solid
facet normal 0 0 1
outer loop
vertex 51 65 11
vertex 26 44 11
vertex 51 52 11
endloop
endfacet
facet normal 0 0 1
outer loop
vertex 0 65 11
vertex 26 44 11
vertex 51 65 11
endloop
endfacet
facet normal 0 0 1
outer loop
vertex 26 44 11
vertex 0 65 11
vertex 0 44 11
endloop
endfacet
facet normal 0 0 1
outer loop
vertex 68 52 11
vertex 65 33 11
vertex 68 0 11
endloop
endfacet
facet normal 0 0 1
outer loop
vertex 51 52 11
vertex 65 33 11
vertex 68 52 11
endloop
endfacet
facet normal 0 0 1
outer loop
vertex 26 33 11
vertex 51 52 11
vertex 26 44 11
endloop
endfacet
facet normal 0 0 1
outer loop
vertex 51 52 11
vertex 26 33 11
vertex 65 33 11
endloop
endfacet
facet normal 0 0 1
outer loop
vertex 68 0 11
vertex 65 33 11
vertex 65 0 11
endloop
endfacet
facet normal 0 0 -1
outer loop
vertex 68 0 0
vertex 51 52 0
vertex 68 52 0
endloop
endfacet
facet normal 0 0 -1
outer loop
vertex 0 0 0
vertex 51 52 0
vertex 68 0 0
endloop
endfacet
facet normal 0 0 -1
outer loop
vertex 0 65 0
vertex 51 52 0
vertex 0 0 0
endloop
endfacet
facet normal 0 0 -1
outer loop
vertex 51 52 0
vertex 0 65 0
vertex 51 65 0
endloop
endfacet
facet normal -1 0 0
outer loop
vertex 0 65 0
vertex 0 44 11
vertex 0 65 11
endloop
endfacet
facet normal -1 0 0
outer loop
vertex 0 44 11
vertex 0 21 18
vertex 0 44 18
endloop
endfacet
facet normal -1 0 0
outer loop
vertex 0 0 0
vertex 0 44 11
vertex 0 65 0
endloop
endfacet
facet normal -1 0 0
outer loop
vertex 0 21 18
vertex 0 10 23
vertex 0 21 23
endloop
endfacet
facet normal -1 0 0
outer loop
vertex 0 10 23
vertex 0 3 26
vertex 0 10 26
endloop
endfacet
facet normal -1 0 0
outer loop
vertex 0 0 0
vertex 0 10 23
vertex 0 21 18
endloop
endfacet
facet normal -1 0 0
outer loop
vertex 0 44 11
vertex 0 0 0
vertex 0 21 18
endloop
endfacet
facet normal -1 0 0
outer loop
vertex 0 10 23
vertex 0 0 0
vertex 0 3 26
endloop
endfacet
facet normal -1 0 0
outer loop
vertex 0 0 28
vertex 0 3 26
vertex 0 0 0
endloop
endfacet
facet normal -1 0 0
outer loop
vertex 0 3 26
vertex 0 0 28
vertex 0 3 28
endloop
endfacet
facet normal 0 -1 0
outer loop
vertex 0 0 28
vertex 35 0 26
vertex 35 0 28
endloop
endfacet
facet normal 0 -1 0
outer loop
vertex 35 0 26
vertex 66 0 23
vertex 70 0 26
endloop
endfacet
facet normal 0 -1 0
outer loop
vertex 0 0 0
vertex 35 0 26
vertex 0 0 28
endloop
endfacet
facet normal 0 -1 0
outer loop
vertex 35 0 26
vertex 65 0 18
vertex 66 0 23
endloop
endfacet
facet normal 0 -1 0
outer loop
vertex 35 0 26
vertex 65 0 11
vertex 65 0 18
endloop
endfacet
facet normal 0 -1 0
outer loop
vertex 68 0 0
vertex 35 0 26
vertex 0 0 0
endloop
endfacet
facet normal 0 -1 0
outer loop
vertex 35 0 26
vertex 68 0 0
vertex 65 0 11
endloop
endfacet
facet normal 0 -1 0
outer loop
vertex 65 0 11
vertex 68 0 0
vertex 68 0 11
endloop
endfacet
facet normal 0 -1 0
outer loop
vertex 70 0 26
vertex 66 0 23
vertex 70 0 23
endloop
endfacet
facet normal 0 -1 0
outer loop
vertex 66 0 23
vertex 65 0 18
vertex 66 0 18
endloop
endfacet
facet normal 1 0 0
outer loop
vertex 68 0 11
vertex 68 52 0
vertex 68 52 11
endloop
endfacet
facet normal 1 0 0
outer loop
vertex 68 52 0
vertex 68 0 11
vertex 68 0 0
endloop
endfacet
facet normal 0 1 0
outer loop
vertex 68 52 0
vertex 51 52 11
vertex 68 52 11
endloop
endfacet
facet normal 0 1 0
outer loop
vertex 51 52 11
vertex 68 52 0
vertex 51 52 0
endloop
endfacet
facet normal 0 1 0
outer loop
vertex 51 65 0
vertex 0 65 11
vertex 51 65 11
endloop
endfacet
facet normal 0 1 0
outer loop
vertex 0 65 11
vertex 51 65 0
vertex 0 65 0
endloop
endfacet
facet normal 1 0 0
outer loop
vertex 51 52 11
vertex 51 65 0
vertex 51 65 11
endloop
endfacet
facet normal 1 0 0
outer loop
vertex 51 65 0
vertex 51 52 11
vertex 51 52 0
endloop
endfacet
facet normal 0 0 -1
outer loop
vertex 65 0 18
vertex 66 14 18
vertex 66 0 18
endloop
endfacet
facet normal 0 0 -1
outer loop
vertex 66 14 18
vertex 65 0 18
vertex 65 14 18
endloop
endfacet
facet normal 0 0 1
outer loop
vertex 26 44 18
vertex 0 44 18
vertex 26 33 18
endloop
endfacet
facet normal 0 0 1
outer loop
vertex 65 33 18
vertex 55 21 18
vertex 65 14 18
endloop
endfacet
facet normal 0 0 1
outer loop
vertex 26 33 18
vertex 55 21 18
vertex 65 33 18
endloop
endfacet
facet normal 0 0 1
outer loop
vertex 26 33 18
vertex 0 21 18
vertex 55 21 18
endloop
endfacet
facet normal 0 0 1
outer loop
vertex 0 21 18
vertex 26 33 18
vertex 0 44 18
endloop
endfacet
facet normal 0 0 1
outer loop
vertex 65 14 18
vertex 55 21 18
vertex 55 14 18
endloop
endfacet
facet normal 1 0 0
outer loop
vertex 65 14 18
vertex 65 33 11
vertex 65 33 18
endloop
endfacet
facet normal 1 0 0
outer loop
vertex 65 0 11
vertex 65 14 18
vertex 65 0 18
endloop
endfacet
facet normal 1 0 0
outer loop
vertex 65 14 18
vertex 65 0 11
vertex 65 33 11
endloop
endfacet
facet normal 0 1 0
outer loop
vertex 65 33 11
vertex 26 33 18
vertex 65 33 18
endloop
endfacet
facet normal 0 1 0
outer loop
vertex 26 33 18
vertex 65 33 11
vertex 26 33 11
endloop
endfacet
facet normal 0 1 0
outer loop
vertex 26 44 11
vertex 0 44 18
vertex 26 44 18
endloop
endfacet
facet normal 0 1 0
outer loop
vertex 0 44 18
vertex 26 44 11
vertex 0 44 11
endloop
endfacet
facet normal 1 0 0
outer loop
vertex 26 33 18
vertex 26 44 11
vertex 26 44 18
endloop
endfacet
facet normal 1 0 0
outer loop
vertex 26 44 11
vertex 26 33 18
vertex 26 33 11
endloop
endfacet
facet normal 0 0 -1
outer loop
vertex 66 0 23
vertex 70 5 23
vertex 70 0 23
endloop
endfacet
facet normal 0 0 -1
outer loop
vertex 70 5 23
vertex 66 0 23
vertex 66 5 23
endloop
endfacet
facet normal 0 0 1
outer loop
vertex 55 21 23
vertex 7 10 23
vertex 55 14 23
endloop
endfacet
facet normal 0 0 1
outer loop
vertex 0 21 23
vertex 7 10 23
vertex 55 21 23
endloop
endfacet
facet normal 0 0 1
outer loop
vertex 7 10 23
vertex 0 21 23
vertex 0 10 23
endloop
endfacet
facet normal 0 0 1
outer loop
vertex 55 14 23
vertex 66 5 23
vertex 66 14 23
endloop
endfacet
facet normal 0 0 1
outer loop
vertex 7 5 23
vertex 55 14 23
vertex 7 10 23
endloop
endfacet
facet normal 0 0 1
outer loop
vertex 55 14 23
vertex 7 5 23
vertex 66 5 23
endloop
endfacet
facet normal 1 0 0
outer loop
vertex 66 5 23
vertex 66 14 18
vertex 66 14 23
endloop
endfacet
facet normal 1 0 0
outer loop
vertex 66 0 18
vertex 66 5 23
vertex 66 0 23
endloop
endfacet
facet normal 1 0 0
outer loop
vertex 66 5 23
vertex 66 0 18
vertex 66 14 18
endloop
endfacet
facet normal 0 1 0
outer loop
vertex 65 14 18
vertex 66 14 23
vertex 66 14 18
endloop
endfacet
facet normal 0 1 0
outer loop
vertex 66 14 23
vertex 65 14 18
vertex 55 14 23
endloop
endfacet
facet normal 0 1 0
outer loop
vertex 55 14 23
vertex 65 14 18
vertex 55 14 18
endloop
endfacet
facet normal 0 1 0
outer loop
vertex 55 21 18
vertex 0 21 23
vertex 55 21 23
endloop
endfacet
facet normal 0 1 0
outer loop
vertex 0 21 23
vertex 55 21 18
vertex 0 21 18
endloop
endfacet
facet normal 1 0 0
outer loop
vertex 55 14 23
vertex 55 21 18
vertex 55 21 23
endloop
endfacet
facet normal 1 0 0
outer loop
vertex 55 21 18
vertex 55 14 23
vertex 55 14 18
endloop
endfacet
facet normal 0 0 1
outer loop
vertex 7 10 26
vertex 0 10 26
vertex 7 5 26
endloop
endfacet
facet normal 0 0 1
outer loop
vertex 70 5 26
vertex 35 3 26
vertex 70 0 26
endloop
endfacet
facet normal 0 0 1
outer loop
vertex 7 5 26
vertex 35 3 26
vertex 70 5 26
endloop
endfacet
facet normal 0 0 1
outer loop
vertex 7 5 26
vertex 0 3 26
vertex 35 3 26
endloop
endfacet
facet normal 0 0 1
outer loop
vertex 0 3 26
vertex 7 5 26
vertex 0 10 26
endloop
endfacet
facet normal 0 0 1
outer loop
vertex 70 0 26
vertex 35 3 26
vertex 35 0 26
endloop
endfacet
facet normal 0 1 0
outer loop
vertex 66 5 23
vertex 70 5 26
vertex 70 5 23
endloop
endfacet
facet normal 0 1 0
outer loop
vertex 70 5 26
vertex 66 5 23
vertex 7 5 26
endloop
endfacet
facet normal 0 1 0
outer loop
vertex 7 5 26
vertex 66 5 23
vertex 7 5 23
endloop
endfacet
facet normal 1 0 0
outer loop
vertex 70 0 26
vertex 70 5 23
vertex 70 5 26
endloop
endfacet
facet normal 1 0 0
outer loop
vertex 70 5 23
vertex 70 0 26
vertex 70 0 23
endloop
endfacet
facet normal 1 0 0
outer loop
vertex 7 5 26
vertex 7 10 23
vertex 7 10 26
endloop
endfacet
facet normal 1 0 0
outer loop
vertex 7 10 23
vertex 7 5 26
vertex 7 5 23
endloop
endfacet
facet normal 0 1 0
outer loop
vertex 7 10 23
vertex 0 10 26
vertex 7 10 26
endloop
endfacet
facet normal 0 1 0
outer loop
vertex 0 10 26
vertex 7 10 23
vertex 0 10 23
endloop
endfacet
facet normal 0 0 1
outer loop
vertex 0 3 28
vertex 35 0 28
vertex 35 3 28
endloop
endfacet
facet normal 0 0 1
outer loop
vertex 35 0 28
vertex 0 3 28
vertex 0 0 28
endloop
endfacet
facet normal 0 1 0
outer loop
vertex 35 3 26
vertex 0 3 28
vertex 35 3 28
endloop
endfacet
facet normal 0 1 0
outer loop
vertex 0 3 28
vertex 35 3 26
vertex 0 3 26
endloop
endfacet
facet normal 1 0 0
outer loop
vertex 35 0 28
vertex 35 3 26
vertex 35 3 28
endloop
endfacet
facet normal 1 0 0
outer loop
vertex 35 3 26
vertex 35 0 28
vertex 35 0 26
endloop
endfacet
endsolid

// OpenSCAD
translate([8.5, 6.5, 5.5]) color([0.1552431358080847, 0.1767648869043179, 0.991228648099722]) cube([17, 13, 11], center=true);
translate([25.5, 6.5, 5.5]) color([0.13558077637136434, 0.20650423900368708, 0.9151210693627757]) cube([17, 13, 11], center=true);
translate([42.5, 6.5, 5.5]) color([0.49673738754911745, 0.7672539256192649, 0.969306850533619]) cube([17, 13, 11], center=true);
translate([59.5, 6.5, 5.5]) color([0.23531586477578126, 0.13212860983739783, 0.23368957459901674]) cube([17, 13, 11], center=true);
translate([8.5, 19.5, 5.5]) color([0.38460662479298113, 0.6084990843462054, 0.1325407149567407]) cube([17, 13, 11], center=true);
translate([25.5, 19.5, 5.5]) color([0.4984659545183915, 0.9178662904203972, 0.6160167741323543]) cube([17, 13, 11], center=true);
translate([42.5, 19.5, 5.5]) color([0.02601445858505036, 0.596125612844632, 0.48919913512172475]) cube([17, 13, 11], center=true);
translate([59.5, 19.5, 5.5]) color([0.30869925031539414, 0.9586301909392594, 0.5555224541780607]) cube([17, 13, 11], center=true);
translate([8.5, 32.5, 5.5]) color([0.16303723797834868, 0.8790785483620981, 0.8092366229990562]) cube([17, 13, 11], center=true);
translate([25.5, 32.5, 5.5]) color([0.7373715302416316, 0.5460288399006699, 0.7042240787132147]) cube([17, 13, 11], center=true);
translate([42.5, 32.5, 5.5]) color([0.07877233817546292, 0.13744427713979768, 0.40185422229333856]) cube([17, 13, 11], center=true);
translate([59.5, 32.5, 5.5]) color([0.1910666288561843, 0.31642065037316636, 0.2917281417853558]) cube([17, 13, 11], center=true);
translate([8.5, 45.5, 5.5]) color([0.9437754009602987, 0.20866341172373193, 0.3151573145870893]) cube([17, 13, 11], center=true);
translate([25.5, 45.5, 5.5]) color([0.7470721078045024, 0.24960896628473228, 0.8629627260654799]) cube([17, 13, 11], center=true);
translate([42.5, 45.5, 5.5]) color([0.6684326881602258, 0.6597695027130189, 0.22591717735012307]) cube([17, 13, 11], center=true);
translate([59.5, 45.5, 5.5]) color([0.3441717078654829, 0.16233220178561225, 0.01697652307419406]) cube([17, 13, 11], center=true);
translate([8.5, 58.5, 5.5]) color([0.5735931064152219, 0.05818297514553228, 0.6304378073753134]) cube([17, 13, 11], center=true);
translate([25.5, 58.5, 5.5]) color([0.35341956482818127, 0.49110709598533775, 0.06132304686728618]) cube([17, 13, 11], center=true);
translate([42.5, 58.5, 5.5]) color([0.24146702174069912, 0.012441234482642782, 0.9455344576677447]) cube([17, 13, 11], center=true);
translate([6.5, 5.5, 14.5]) color([0.3266678829978785, 0.820956849026723, 0.34492851027915805]) cube([13, 11, 7], center=true);
translate([19.5, 5.5, 14.5]) color([0.6639756368298299, 0.13585073420724958, 0.9219835342207869]) cube([13, 11, 7], center=true);
translate([32.5, 5.5, 14.5]) color([0.44896684911260887, 0.1420549627992148, 0.3119518323014343]) cube([13, 11, 7], center=true);
translate([45.5, 5.5, 14.5]) color([0.6490756968320398, 0.7280642389267371, 0.7852833252199665]) cube([13, 11, 7], center=true);
translate([58.5, 5.5, 14.5]) color([0.40863068686923587, 0.009633238682779877, 0.8909238596539266]) cube([13, 11, 7], center=true);
translate([6.5, 16.5, 14.5]) color([0.533705581213062, 0.8046005274030336, 0.9806276909012095]) cube([13, 11, 7], center=true);
translate([19.5, 16.5, 14.5]) color([0.7049346898693578, 0.7590860206033218, 0.5647284680717275]) cube([13, 11, 7], center=true);
translate([32.5, 16.5, 14.5]) color([0.12259546226958773, 0.9539533584587191, 0.1713156178825357]) cube([13, 11, 7], center=true);
translate([45.5, 16.5, 14.5]) color([0.5005542720722199, 0.621843985236089, 0.6619765424276485]) cube([13, 11, 7], center=true);
translate([58.5, 16.5, 14.5]) color([0.8400519693824264, 0.699601591737329, 0.07964741684534404]) cube([13, 11, 7], center=true);
translate([6.5, 27.5, 14.5]) color([0.23738047361475634, 0.8282556520451495, 0.1762738246231843]) cube([13, 11, 7], center=true);
translate([19.5, 27.5, 14.5]) color([0.9459581227747745, 0.9565644324307663, 0.8963269305888116]) cube([13, 11, 7], center=true);
translate([32.5, 27.5, 14.5]) color([0.7428117304122551, 0.8383436924491765, 0.5614087817692366]) cube([13, 11, 7], center=true);
translate([45.5, 27.5, 14.5]) color([0.7177928021437573, 0.4271772721979724, 0.8646648421725511]) cube([13, 11, 7], center=true);
translate([58.5, 27.5, 14.5]) color([0.10365846470378459, 0.6285317276232824, 0.7101075213407797]) cube([13, 11, 7], center=true);
translate([6.5, 38.5, 14.5]) color([0.6149371087697887, 0.0400488022899097, 0.34025031183581533]) cube([13, 11, 7], center=true);
translate([19.5, 38.5, 14.5]) color([0.7380159626358669, 0.3765176313166855, 0.6257641682954356]) cube([13, 11, 7], center=true);
translate([5.5, 3.5, 20.5]) color([0.8894786539399329, 0.4963449395419606, 0.3583651728386771]) cube([11, 7, 5], center=true);
translate([16.5, 3.5, 20.5]) color([0.6716454412848432, 0.45811681625355094, 0.5074379917667022]) cube([11, 7, 5], center=true);
translate([27.5, 3.5, 20.5]) color([0.16228475224599026, 0.7529781863444399, 0.3376457636791449]) cube([11, 7, 5], center=true);
translate([38.5, 3.5, 20.5]) color([0.8033239356600728, 0.9444207727357242, 0.014783921172948133]) cube([11, 7, 5], center=true);
translate([49.5, 3.5, 20.5]) color([0.5303420268039528, 0.2882277186993394, 0.4689175335863792]) cube([11, 7, 5], center=true);
translate([60.5, 3.5, 20.5]) color([0.03492832759702502, 0.5317931441254861, 0.552095437515129]) cube([11, 7, 5], center=true);
translate([5.5, 10.5, 20.5]) color([0.9340898594770107, 0.03830085289416996, 0.3950652682884612]) cube([11, 7, 5], center=true);
translate([16.5, 10.5, 20.5]) color([0.1200155720396251, 0.34658884626630715, 0.051152415727703016]) cube([11, 7, 5], center=true);
translate([27.5, 10.5, 20.5]) color([0.2730496953424699, 0.9956802504828091, 0.25391998649183944]) cube([11, 7, 5], center=true);
translate([38.5, 10.5, 20.5]) color([0.6803935586065328, 0.7027090324157298, 0.9291230685247301]) cube([11, 7, 5], center=true);
translate([49.5, 10.5, 20.5]) color([0.9949404722907454, 0.7620813713006523, 0.7625973189567923]) cube([11, 7, 5], center=true);
translate([60.5, 10.5, 20.5]) color([0.5162610213479427, 0.3860717563215982, 0.8343975914408754]) cube([11, 7, 5], center=true);
translate([5.5, 17.5, 20.5]) color([0.2506337702942619, 0.11599539642064438, 0.9817240858781537]) cube([11, 7, 5], center=true);
translate([16.5, 17.5, 20.5]) color([0.8047994372884794, 0.9431012043694105, 0.24264659424234813]) cube([11, 7, 5], center=true);
translate([27.5, 17.5, 20.5]) color([0.6738638931519124, 0.5327800265053269, 0.8756440829735669]) cube([11, 7, 5], center=true);
translate([38.5, 17.5, 20.5]) color([0.16255101499230828, 0.8680483691353614, 0.15305579700066485]) cube([11, 7, 5], center=true);
translate([49.5, 17.5, 20.5]) color([0.8462165202751376, 0.8200801239095041, 0.5849326984313064]) cube([11, 7, 5], center=true);
translate([3.5, 2.5, 24.5]) color([0.05125489506773162, 0.156166769208809, 0.34458118202681143]) cube([7, 5, 3], center=true);
translate([10.5, 2.5, 24.5]) color([0.291190613997825, 0.29342424365134856, 0.49485912757206985]) cube([7, 5, 3], center=true);
translate([17.5, 2.5, 24.5]) color([0.40365829021262367, 0.43100562682353716, 0.17003546655932655]) cube([7, 5, 3], center=true);
translate([24.5, 2.5, 24.5]) color([0.788340085303476, 0.5686027559906347, 0.44188886974638586]) cube([7, 5, 3], center=true);
translate([31.5, 2.5, 24.5]) color([0.3413461590512491, 0.009317740415098474, 0.72162474304745]) cube([7, 5, 3], center=true);
translate([38.5, 2.5, 24.5]) color([0.9099060293040379, 0.6642090292154819, 0.6628365798191557]) cube([7, 5, 3], center=true);
translate([45.5, 2.5, 24.5]) color([0.2575988974219705, 0.6122127561841502, 0.07024606726227145]) cube([7, 5, 3], center=true);
translate([52.5, 2.5, 24.5]) color([0.936077955543095, 0.27870721332570936, 0.8301443917589898]) cube([7, 5, 3], center=true);
translate([59.5, 2.5, 24.5]) color([0.5295296249528143, 0.06328696503387199, 0.639390097241117]) cube([7, 5, 3], center=true);
translate([66.5, 2.5, 24.5]) color([0.579686955437464, 0.9416538141960143, 0.6321291610349786]) cube([7, 5, 3], center=true);
translate([3.5, 7.5, 24.5]) color([0.5434228748459046, 0.38469874676133664, 0.434637548519362]) cube([7, 5, 3], center=true);
translate([2.5, 1.5, 27.0]) color([0.31139777068021024, 0.01363511702942577, 0.7785312160167684]) cube([5, 3, 2], center=true);
translate([7.5, 1.5, 27.0]) color([0.8197509625398982, 0.28044077713976767, 0.2581907625337724]) cube([5, 3, 2], center=true);
translate([12.5, 1.5, 27.0]) color([0.5272652548146236, 0.3179301097250754, 0.3422638341038545]) cube([5, 3, 2], center=true);
translate([17.5, 1.5, 27.0]) color([0.7055726929201963, 0.43169639849300545, 0.14170724037842175]) cube([5, 3, 2], center=true);
translate([22.5, 1.5, 27.0]) color([0.0059275683019511805, 0.5113413643489257, 0.7846494738841625]) cube([5, 3, 2], center=true);
translate([27.5, 1.5, 27.0]) color([0.7013909140505133, 0.7815279332048084, 0.38414456219182536]) cube([5, 3, 2], center=true);
translate([32.5, 1.5, 27.0]) color([0.4641305725985776, 0.036369164001931575, 0.9124290899309246]) cube([5, 3, 2], center=true);
